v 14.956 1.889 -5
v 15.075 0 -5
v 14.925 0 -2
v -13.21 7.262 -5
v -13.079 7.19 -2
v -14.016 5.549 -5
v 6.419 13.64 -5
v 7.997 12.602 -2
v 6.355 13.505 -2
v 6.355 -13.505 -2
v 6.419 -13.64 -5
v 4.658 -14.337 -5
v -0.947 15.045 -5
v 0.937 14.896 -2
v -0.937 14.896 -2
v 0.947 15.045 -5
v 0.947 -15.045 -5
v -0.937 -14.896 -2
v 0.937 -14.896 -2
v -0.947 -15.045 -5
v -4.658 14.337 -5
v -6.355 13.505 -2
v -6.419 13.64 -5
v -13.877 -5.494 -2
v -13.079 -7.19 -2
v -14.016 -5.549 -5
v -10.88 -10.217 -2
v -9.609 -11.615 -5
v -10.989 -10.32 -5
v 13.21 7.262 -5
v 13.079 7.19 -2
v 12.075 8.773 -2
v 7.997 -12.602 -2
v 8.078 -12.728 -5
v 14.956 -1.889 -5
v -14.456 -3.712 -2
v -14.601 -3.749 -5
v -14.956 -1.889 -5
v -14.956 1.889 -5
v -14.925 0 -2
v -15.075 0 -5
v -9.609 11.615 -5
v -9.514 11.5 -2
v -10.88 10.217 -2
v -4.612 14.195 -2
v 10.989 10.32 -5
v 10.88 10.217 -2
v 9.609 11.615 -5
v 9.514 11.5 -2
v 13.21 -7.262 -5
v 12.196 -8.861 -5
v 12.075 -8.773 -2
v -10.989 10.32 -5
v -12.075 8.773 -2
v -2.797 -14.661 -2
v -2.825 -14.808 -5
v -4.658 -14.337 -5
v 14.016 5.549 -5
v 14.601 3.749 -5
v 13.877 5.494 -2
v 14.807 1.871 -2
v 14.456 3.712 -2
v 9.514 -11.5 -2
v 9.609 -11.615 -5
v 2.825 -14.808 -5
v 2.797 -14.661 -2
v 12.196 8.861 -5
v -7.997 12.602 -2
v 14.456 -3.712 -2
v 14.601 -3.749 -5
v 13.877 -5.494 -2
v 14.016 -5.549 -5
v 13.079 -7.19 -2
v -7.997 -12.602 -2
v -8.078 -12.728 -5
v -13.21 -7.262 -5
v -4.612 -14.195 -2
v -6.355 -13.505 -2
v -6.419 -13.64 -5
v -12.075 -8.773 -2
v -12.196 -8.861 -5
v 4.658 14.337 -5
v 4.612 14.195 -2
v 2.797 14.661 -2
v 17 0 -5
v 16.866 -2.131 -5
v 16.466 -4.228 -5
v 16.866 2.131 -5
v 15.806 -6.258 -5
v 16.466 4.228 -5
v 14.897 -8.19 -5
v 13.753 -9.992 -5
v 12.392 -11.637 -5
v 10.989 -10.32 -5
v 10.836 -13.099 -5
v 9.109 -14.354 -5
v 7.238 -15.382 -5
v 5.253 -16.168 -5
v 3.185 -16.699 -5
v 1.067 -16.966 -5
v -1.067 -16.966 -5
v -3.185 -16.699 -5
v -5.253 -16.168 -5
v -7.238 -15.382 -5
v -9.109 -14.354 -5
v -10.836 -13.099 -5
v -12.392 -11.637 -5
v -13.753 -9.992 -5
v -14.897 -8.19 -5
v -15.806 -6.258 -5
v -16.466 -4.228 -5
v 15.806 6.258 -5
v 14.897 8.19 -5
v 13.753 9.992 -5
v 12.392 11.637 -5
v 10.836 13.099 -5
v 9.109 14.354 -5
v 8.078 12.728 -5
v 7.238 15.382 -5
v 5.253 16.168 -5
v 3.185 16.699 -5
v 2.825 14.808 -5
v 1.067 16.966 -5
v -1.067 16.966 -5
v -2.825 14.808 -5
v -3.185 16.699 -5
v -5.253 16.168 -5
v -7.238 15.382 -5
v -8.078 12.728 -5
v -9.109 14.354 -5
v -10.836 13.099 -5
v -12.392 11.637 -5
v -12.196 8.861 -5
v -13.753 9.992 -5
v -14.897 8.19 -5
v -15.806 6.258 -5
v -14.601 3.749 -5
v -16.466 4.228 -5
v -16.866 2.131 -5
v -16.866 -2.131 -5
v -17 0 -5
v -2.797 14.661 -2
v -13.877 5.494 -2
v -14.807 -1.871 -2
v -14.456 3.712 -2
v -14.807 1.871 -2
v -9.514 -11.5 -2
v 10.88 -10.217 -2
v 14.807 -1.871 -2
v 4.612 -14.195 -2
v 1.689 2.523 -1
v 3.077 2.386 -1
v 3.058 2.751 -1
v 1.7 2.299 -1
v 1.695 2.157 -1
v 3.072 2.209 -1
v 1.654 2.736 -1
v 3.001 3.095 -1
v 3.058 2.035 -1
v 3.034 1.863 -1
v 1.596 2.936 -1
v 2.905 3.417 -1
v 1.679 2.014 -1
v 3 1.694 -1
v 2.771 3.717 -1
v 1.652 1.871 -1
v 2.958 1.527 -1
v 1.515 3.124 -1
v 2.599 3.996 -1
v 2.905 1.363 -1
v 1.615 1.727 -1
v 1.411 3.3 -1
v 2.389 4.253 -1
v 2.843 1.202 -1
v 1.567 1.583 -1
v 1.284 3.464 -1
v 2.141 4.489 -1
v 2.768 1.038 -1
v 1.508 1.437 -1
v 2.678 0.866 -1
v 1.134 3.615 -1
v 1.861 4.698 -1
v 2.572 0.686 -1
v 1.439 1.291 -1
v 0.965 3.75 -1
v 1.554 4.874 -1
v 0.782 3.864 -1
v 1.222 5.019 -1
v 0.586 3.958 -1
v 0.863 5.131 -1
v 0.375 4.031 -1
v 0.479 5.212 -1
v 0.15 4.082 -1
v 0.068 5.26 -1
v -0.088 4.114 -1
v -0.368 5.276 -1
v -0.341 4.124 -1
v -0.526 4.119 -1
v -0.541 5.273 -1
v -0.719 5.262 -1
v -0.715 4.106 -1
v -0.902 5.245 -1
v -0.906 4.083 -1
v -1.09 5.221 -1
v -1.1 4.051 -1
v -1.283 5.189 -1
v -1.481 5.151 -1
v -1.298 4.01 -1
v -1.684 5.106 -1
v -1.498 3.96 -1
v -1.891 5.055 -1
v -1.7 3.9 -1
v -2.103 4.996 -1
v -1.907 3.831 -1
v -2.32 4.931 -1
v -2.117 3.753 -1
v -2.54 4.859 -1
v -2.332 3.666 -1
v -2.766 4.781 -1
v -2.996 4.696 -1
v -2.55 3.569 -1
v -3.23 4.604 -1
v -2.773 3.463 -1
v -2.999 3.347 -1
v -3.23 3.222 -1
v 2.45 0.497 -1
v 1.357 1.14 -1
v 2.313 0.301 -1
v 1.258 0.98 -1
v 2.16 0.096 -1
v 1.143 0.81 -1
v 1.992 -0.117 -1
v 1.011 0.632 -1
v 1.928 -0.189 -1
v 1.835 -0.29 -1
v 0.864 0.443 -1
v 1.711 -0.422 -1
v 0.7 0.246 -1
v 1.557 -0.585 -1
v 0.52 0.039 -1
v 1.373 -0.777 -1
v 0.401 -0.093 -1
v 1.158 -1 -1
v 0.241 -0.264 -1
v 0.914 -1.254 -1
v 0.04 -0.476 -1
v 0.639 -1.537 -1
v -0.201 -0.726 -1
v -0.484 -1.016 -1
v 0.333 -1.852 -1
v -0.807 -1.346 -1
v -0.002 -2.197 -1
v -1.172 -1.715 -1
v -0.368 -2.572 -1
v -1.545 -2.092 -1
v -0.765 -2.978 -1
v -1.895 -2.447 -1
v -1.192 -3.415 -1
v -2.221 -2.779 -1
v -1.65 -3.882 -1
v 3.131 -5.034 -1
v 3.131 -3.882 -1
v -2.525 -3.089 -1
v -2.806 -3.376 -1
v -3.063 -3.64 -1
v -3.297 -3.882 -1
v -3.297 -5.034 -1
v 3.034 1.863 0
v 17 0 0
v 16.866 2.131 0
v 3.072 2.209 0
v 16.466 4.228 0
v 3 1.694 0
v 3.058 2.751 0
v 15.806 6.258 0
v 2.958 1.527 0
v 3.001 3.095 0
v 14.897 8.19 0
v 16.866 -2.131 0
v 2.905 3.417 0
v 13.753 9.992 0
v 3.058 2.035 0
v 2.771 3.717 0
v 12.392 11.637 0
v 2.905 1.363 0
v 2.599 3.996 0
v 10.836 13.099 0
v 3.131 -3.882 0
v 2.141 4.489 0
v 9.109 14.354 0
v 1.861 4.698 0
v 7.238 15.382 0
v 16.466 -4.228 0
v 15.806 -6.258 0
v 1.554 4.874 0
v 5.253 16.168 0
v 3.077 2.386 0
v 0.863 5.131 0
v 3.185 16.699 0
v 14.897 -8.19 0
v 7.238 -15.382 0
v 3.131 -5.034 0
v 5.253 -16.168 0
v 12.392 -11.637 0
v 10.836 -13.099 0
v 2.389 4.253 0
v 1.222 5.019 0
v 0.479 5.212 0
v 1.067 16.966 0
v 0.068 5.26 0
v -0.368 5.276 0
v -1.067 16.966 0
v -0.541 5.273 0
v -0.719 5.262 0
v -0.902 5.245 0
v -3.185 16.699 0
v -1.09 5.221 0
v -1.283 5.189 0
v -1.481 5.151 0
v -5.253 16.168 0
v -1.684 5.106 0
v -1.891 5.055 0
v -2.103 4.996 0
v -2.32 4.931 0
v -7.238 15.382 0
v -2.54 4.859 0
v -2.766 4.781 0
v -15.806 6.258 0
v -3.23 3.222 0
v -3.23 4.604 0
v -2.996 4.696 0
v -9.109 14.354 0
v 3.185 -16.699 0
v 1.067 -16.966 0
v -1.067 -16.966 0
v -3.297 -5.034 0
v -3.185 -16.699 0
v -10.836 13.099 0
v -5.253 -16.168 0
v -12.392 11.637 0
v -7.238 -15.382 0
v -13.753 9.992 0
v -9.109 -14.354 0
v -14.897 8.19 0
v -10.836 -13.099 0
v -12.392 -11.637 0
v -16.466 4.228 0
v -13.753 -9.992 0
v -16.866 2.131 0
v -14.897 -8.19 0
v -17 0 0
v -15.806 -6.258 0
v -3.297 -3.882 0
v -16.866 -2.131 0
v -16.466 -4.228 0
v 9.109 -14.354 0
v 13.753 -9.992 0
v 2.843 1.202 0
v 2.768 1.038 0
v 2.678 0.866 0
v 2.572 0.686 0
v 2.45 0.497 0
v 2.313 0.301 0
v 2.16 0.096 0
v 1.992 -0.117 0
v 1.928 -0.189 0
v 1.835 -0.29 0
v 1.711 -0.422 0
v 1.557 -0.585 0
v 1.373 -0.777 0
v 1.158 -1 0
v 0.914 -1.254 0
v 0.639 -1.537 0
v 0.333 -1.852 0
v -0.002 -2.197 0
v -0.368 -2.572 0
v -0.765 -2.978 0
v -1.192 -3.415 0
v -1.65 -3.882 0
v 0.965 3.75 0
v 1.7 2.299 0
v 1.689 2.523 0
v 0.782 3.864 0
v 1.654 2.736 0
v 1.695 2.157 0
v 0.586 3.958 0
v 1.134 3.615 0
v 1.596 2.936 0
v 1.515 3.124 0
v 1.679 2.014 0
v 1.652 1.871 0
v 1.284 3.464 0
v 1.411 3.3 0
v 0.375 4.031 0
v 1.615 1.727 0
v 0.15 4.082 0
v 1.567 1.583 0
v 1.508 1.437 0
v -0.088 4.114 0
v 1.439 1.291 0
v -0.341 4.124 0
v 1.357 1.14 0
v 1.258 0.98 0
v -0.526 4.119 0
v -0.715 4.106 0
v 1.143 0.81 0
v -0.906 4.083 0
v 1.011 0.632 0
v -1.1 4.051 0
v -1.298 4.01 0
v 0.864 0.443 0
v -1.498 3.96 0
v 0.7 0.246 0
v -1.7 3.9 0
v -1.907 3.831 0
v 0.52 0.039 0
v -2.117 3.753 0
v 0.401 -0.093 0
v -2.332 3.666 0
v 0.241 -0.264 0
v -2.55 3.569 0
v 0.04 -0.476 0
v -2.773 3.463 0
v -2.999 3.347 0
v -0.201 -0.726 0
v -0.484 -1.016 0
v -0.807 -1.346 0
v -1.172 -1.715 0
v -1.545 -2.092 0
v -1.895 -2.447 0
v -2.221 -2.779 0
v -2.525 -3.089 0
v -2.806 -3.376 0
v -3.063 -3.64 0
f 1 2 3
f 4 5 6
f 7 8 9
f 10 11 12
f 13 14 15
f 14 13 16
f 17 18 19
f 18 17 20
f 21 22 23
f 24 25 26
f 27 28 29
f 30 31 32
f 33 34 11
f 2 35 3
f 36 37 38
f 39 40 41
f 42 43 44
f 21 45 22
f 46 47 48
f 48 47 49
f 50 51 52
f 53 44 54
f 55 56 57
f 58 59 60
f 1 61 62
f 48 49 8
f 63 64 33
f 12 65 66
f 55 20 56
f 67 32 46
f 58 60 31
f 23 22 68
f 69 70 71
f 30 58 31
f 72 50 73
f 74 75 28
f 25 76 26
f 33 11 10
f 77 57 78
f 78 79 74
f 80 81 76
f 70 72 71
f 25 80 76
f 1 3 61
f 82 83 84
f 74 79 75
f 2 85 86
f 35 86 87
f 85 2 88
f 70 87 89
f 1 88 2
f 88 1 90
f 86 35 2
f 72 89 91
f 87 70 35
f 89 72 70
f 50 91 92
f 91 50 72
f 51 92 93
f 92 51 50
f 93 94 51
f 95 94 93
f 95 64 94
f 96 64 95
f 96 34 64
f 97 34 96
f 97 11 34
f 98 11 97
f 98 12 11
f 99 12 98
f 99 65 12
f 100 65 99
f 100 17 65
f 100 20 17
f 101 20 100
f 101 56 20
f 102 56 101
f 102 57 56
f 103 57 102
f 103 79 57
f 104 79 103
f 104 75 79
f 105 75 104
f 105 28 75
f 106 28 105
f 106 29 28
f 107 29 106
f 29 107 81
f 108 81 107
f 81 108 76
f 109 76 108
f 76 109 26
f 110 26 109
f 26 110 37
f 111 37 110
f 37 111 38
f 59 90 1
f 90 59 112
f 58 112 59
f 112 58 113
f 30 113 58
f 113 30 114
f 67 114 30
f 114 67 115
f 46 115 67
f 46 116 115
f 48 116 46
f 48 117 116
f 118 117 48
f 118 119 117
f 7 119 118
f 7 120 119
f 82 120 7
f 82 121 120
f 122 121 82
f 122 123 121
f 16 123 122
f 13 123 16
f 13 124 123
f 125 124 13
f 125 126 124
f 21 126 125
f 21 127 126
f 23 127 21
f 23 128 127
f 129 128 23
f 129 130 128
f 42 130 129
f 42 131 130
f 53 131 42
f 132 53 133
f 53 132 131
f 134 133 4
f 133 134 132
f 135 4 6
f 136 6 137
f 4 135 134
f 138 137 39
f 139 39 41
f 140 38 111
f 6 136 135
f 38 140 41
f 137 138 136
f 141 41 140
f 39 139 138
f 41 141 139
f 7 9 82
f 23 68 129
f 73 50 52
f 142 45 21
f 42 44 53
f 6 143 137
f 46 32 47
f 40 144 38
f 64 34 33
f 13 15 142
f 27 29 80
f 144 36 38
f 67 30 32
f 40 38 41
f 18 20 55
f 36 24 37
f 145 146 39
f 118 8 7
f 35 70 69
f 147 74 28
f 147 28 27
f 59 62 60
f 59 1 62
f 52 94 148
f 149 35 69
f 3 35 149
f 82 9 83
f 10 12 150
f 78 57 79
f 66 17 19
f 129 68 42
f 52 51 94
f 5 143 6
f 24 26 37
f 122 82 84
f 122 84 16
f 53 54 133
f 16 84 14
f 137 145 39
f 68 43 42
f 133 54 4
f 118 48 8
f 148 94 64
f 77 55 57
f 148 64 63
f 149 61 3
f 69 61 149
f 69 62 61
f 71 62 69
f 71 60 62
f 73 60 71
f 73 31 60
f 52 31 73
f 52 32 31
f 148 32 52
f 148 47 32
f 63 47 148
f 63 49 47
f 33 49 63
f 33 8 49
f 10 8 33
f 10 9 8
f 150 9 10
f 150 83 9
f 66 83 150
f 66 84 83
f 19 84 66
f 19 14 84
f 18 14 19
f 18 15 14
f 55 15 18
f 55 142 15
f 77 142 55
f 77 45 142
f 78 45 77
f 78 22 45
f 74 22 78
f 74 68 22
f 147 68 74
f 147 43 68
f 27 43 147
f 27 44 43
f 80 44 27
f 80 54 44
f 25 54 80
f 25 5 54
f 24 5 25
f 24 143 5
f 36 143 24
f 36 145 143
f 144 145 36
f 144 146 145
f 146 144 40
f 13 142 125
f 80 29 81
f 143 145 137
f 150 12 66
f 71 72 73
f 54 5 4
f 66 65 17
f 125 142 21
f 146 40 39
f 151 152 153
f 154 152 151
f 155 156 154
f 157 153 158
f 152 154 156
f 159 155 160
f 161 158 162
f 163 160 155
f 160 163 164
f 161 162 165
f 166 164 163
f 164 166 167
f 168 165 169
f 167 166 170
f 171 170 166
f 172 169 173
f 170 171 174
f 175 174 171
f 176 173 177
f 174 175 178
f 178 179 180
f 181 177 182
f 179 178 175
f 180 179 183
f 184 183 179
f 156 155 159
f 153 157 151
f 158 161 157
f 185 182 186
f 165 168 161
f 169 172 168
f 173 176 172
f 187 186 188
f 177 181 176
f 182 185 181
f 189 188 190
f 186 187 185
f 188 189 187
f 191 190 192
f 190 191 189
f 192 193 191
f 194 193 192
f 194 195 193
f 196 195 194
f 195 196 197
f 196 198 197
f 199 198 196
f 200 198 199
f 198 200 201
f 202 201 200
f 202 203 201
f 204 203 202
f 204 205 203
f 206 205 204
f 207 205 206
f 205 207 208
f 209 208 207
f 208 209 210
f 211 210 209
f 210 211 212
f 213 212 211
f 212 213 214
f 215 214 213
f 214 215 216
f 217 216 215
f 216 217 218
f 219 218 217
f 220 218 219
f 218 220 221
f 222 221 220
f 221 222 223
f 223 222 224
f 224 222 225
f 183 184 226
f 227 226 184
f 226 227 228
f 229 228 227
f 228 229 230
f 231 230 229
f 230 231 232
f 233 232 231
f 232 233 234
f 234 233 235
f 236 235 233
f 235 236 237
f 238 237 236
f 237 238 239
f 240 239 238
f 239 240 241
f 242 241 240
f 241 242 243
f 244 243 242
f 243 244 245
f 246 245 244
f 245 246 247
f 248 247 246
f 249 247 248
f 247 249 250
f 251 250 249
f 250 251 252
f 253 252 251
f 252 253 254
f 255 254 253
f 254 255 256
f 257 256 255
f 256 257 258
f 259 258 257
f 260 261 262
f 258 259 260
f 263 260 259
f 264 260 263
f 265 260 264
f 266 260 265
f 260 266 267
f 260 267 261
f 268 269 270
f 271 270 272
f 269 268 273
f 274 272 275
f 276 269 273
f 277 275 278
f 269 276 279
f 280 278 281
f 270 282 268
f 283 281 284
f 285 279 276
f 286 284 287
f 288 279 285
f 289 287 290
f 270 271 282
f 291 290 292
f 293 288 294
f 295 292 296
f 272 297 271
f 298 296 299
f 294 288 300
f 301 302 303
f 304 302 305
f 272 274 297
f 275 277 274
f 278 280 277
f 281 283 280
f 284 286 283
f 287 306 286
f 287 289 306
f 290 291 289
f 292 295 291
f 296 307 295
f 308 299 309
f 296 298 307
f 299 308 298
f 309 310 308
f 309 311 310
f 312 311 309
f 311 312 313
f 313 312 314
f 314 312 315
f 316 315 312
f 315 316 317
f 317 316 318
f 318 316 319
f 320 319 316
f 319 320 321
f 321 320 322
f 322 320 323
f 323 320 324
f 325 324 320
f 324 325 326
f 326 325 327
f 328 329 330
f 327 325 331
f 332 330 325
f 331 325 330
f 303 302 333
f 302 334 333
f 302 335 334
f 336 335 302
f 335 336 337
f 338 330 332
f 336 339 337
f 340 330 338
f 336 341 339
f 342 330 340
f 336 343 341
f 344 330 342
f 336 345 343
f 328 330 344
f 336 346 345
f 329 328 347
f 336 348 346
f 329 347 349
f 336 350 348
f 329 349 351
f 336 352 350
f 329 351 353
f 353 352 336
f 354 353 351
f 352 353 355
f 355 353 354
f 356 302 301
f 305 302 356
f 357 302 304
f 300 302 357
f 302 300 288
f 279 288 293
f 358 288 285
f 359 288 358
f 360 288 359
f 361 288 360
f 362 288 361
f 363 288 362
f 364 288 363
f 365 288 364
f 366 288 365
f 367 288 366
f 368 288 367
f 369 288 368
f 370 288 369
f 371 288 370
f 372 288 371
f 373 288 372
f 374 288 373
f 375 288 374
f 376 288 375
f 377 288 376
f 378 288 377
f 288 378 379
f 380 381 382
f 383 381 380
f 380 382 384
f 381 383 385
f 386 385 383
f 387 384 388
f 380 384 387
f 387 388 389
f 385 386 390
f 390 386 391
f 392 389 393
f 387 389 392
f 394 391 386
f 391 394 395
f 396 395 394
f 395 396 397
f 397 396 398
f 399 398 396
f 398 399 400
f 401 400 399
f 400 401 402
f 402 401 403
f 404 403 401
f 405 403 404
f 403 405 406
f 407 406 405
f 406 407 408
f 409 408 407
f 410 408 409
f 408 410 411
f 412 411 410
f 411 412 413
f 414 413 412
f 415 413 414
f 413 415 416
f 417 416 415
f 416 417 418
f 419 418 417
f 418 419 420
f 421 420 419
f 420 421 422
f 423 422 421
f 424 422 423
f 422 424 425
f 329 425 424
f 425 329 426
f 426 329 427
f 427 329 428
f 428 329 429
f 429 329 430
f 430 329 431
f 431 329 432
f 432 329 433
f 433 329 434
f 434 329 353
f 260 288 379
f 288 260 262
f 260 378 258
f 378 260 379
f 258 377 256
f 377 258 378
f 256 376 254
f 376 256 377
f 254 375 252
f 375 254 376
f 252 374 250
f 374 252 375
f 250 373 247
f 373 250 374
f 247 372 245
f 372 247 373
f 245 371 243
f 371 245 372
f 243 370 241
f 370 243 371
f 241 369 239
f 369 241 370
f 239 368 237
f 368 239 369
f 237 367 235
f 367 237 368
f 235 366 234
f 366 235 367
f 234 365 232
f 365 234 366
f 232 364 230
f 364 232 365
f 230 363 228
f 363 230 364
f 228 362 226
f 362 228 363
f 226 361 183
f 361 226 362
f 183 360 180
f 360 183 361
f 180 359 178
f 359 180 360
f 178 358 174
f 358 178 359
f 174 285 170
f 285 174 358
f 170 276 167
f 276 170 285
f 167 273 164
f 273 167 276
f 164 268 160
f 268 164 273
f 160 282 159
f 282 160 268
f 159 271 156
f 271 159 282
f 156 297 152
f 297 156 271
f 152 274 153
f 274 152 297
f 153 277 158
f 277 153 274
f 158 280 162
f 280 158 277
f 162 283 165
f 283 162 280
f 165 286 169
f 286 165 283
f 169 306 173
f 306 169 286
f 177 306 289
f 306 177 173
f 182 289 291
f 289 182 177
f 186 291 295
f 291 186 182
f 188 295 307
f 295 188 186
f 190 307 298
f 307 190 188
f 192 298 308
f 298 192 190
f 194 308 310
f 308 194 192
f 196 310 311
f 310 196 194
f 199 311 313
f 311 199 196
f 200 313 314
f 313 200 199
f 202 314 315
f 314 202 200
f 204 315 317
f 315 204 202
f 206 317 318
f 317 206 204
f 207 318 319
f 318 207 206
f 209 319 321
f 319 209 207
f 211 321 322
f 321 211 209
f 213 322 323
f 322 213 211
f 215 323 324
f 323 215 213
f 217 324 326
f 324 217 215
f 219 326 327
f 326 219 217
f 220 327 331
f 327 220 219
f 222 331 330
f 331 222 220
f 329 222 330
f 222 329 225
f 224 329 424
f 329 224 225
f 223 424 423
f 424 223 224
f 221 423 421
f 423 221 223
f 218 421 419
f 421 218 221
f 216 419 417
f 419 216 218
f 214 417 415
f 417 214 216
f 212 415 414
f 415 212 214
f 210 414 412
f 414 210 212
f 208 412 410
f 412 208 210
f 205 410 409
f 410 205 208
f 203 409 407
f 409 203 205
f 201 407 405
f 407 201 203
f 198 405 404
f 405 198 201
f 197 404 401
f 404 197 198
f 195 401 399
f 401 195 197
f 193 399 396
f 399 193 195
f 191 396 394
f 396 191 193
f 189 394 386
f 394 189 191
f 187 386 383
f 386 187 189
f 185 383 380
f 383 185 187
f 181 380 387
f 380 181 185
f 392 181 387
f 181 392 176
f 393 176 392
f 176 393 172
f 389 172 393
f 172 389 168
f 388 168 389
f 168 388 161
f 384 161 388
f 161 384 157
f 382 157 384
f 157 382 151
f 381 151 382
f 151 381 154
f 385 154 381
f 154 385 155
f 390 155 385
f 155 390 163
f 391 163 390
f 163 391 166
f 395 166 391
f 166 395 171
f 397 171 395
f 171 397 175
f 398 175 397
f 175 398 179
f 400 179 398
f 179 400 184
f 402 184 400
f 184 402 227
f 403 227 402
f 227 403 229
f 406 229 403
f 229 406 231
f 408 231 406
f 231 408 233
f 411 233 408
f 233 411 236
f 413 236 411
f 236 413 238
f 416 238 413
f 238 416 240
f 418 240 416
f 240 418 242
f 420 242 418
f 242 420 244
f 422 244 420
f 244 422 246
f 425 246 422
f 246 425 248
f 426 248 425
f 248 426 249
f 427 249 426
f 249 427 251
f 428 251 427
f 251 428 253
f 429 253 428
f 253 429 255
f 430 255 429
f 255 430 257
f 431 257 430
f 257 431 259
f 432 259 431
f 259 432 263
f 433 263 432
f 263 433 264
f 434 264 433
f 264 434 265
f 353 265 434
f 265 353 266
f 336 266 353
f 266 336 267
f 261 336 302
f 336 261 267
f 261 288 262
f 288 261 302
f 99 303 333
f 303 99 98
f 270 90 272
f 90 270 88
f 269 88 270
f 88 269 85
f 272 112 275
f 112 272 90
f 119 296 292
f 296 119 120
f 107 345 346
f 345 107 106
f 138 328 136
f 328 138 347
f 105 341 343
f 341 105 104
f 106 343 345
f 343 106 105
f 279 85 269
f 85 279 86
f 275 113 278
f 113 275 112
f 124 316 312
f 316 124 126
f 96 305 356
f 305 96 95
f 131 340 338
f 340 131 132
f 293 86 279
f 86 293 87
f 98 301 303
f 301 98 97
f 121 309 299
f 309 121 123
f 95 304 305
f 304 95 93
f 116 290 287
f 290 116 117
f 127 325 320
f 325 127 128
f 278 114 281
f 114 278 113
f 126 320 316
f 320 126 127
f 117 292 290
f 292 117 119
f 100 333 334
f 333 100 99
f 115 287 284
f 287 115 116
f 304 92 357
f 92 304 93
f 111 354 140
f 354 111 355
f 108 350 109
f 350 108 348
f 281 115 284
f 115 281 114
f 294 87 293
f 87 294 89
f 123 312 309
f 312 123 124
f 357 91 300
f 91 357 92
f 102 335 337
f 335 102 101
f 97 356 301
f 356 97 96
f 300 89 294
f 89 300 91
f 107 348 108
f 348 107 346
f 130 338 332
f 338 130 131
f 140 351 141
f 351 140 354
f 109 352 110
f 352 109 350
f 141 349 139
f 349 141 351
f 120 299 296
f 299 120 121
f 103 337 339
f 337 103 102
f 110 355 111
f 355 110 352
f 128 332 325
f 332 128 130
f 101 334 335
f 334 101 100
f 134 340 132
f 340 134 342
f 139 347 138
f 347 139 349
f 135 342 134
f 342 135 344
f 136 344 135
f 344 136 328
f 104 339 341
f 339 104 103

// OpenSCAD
$fn = 50;

difference() {
	union() {
		translate(v = [0, 0, -5.0]) {
			cylinder(h = 5, r = 17.0);
		}
	}
	union() {
		#translate(v = [0, 0, -5.0]) {
			cylinder(h = 3, r1 = 15.075, r2 = 14.925);
		}
		translate(v = [0, 0, -1]) {
			linear_extrude(height = 1) {
				text(font = "Impact", halign = "center", size = 10, text = "2", valign = "center");
			}
		}
	}
}
